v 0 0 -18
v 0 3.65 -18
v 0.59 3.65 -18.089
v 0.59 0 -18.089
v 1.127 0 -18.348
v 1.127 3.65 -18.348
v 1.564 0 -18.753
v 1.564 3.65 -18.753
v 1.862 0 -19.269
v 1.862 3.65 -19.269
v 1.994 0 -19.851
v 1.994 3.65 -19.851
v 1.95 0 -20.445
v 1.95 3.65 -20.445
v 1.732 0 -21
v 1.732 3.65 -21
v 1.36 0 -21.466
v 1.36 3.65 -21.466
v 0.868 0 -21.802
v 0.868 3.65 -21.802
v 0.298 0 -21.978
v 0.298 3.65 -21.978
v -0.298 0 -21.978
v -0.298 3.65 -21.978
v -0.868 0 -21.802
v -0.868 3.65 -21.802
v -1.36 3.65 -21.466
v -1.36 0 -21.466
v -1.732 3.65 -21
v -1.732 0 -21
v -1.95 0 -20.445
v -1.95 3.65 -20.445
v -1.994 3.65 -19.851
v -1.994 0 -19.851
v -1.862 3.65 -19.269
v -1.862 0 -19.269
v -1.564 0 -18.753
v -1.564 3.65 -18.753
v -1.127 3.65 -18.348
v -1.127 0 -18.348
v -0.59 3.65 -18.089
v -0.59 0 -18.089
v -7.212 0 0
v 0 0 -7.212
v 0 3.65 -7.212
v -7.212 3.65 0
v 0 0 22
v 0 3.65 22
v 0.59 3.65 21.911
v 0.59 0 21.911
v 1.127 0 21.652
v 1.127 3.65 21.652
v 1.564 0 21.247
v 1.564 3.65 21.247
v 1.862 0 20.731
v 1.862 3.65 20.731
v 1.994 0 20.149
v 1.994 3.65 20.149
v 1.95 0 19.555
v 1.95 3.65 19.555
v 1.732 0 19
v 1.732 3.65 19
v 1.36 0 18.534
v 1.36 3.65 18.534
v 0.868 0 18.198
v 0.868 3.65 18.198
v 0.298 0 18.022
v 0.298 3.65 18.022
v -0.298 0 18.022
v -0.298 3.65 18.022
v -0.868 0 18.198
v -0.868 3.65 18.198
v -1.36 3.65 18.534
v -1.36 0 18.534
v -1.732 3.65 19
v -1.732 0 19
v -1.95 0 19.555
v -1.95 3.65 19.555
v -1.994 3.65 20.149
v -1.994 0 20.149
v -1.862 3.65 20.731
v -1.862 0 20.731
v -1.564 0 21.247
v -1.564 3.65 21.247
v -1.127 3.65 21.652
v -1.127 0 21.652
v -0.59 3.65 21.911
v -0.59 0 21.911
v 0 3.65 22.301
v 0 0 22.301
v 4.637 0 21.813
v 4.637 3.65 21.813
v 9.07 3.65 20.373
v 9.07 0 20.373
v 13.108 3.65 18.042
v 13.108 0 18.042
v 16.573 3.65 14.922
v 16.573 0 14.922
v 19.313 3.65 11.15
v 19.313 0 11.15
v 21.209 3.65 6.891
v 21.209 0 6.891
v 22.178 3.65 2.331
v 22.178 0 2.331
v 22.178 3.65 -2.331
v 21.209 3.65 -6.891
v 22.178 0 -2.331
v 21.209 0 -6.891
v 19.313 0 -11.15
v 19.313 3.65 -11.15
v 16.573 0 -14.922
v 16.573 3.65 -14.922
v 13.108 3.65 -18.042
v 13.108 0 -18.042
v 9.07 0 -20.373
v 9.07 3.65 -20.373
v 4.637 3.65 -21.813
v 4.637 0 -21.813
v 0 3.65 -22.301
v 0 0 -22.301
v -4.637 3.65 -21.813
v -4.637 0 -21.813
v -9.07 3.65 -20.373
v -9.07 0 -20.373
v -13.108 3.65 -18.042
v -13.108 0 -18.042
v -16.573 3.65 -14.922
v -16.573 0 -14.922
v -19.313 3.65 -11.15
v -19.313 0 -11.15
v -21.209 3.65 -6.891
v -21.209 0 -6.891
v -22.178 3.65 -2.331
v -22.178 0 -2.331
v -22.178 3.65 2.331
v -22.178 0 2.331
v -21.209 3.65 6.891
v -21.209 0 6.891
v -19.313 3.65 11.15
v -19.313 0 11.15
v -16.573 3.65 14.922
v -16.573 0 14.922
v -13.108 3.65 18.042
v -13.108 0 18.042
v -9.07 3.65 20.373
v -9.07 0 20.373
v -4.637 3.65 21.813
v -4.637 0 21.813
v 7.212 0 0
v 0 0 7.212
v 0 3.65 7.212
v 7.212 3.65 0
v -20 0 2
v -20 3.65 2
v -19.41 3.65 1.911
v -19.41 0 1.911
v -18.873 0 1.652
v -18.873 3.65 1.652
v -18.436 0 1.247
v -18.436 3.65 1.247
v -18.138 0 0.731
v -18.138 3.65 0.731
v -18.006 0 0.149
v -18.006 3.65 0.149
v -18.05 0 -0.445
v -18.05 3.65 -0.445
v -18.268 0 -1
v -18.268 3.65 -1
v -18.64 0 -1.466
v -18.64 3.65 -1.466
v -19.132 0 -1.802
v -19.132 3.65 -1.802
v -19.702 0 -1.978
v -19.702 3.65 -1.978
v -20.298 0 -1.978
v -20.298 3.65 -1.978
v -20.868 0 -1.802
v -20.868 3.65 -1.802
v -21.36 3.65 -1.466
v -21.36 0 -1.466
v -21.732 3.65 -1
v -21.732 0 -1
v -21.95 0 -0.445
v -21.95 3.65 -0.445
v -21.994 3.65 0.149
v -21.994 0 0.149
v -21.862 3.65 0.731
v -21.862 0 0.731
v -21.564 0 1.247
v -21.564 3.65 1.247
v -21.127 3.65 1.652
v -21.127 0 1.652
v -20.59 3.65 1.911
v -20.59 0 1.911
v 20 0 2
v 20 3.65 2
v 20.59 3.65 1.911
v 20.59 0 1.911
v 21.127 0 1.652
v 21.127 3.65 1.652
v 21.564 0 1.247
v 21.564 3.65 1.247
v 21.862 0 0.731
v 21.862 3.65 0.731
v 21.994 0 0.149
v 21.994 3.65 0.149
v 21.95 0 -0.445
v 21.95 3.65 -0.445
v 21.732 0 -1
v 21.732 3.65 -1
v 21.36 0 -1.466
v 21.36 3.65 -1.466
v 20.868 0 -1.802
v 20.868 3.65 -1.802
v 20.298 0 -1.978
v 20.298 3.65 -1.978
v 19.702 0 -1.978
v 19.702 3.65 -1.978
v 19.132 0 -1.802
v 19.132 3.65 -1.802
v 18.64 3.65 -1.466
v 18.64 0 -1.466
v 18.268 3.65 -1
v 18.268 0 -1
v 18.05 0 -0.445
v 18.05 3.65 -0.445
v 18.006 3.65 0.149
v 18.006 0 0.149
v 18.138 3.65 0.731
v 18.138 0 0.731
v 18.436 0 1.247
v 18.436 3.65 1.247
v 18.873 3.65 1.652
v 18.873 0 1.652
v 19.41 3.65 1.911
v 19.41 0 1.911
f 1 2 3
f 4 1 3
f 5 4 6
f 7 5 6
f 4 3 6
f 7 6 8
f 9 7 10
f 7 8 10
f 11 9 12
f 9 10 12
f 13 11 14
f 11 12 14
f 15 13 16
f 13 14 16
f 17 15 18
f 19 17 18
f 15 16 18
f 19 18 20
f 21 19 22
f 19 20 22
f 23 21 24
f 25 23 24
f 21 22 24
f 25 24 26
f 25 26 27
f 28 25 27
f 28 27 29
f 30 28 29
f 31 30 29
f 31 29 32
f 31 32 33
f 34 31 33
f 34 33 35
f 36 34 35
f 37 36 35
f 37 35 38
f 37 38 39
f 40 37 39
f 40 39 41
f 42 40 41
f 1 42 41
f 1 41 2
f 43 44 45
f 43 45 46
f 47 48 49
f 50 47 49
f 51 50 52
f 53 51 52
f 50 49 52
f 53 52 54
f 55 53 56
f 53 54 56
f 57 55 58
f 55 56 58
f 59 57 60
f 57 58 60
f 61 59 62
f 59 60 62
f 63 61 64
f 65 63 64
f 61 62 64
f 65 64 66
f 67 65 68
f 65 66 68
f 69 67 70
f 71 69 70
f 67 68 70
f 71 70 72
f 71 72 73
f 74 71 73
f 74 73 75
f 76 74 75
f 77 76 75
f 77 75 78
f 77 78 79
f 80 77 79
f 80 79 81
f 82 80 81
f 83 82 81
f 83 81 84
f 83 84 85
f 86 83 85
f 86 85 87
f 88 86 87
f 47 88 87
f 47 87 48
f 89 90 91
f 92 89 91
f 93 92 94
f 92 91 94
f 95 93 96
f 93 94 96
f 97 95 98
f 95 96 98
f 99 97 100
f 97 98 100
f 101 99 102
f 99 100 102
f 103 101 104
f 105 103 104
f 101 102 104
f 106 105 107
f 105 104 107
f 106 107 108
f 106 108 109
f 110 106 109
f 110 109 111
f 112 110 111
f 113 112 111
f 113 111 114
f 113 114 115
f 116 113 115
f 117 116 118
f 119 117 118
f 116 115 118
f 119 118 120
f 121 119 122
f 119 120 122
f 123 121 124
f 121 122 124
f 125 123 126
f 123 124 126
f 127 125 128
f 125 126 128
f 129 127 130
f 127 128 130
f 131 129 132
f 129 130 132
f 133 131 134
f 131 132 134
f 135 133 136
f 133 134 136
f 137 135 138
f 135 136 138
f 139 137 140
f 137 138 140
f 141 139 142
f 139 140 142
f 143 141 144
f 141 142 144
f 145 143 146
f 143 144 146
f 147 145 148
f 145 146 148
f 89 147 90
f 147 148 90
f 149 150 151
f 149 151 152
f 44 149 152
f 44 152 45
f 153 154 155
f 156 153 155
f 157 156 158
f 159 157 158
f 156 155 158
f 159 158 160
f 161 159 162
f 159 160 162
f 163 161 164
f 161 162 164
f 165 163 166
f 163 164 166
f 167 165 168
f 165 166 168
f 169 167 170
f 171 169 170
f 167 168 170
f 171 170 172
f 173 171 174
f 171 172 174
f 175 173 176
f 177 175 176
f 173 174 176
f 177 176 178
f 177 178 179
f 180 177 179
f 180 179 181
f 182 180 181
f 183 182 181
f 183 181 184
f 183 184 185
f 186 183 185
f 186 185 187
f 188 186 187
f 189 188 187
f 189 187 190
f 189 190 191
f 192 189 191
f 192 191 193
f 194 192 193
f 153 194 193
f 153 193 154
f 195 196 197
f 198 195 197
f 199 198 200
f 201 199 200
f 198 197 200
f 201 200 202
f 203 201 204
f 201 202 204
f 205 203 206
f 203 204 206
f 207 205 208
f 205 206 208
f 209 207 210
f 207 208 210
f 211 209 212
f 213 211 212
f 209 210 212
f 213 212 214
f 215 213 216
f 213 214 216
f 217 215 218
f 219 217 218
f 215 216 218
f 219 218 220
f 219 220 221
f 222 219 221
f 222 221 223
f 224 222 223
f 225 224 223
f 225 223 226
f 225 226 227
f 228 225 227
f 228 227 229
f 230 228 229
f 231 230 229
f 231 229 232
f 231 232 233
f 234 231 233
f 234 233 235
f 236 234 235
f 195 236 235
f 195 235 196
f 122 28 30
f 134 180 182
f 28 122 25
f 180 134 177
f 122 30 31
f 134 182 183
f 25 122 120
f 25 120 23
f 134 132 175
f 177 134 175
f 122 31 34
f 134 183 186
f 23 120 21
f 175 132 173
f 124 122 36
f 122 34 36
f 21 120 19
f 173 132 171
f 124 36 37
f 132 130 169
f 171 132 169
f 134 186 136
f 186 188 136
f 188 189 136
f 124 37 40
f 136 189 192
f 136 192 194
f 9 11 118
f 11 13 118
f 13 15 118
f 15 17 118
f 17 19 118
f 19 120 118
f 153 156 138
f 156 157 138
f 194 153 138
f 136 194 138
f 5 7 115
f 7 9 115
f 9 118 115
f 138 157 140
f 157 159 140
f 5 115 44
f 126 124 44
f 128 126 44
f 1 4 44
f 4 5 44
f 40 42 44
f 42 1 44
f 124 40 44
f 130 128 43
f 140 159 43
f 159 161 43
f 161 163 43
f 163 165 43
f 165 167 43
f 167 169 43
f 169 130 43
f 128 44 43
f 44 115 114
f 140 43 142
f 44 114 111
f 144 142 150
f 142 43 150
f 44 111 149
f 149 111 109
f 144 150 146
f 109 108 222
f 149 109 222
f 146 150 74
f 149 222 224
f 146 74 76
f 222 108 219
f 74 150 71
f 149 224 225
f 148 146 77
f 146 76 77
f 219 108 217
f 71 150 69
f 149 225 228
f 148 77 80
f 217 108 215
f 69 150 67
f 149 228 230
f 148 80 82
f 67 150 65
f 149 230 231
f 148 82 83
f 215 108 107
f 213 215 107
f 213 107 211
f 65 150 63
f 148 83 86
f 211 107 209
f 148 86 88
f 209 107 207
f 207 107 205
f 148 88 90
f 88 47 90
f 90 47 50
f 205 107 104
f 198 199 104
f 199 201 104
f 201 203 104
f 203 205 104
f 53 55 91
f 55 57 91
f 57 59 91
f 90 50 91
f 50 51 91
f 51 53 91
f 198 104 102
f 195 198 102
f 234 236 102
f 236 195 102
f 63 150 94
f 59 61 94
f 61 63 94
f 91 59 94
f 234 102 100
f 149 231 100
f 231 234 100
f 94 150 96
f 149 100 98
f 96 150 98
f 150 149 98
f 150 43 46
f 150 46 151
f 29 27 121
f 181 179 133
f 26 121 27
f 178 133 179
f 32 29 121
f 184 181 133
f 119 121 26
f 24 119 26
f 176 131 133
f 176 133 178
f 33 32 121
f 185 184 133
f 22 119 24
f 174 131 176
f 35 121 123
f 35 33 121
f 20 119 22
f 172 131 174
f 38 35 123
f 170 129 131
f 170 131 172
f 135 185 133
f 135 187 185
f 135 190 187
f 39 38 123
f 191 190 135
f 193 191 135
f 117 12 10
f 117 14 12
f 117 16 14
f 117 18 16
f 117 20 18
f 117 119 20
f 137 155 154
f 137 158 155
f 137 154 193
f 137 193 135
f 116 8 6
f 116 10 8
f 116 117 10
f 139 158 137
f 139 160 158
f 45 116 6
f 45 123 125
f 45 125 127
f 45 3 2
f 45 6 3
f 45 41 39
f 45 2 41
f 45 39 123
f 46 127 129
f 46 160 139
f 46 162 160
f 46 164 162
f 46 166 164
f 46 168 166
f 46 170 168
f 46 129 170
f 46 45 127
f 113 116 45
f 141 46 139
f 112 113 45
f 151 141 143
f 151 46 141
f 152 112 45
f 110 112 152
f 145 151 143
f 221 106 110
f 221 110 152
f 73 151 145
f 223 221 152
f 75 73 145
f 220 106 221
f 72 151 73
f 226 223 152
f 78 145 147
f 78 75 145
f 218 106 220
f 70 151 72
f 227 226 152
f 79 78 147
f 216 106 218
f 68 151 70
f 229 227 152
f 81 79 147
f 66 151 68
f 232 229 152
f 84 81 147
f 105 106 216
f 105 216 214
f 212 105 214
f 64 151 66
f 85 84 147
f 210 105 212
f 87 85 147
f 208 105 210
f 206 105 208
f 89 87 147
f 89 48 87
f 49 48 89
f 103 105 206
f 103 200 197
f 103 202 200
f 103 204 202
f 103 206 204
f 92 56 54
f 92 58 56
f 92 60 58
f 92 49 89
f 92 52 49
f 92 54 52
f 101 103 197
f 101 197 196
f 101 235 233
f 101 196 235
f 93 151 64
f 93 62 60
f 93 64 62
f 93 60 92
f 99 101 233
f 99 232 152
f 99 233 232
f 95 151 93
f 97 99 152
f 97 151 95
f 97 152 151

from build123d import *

# Parameters (mm, degrees)
SKETCH1_R           = 22.300536675
BOSS_EXTRUDE1_DEPTH = 3.65
SKETCH2_R           = 2
CUT_EXTRUDE1_DEPTH  = 32.748234155


with BuildPart() as part:
    # Sketch1 → Boss-Extrude1 (new body)
    with BuildSketch(Plane(origin=(0, 0, 0), x_dir=(1, 0, 0), z_dir=(0, 1, 0))):
        with Locations(Location((0, 0, 0), (0, 0, 270))):
            Circle(SKETCH1_R)
        Polygon((-7.212489168, 0), (0, -7.212489168), (7.212489168, 0), (0, 7.212489168), align=None, mode=Mode.SUBTRACT)
    extrude(amount=BOSS_EXTRUDE1_DEPTH)

    # Sketch2 → Cut-Extrude1 (cut, through all)
    with BuildSketch(Plane(origin=(0, 3.65, 0), x_dir=(1, 0, 0), z_dir=(0, 1, 0))):
        with Locations(Location((0, 20, 0), (0, 0, 270))):
            Circle(SKETCH2_R)
        with Locations(Location((20, 0, 0), (0, 0, 270))):
            Circle(SKETCH2_R)
        with Locations(Location((0, -20, 0), (0, 0, 270))):
            Circle(SKETCH2_R)
        with Locations(Location((-20, 0, 0), (0, 0, 270))):
            Circle(SKETCH2_R)
    extrude(amount=-CUT_EXTRUDE1_DEPTH, mode=Mode.SUBTRACT)


solid = part.part
